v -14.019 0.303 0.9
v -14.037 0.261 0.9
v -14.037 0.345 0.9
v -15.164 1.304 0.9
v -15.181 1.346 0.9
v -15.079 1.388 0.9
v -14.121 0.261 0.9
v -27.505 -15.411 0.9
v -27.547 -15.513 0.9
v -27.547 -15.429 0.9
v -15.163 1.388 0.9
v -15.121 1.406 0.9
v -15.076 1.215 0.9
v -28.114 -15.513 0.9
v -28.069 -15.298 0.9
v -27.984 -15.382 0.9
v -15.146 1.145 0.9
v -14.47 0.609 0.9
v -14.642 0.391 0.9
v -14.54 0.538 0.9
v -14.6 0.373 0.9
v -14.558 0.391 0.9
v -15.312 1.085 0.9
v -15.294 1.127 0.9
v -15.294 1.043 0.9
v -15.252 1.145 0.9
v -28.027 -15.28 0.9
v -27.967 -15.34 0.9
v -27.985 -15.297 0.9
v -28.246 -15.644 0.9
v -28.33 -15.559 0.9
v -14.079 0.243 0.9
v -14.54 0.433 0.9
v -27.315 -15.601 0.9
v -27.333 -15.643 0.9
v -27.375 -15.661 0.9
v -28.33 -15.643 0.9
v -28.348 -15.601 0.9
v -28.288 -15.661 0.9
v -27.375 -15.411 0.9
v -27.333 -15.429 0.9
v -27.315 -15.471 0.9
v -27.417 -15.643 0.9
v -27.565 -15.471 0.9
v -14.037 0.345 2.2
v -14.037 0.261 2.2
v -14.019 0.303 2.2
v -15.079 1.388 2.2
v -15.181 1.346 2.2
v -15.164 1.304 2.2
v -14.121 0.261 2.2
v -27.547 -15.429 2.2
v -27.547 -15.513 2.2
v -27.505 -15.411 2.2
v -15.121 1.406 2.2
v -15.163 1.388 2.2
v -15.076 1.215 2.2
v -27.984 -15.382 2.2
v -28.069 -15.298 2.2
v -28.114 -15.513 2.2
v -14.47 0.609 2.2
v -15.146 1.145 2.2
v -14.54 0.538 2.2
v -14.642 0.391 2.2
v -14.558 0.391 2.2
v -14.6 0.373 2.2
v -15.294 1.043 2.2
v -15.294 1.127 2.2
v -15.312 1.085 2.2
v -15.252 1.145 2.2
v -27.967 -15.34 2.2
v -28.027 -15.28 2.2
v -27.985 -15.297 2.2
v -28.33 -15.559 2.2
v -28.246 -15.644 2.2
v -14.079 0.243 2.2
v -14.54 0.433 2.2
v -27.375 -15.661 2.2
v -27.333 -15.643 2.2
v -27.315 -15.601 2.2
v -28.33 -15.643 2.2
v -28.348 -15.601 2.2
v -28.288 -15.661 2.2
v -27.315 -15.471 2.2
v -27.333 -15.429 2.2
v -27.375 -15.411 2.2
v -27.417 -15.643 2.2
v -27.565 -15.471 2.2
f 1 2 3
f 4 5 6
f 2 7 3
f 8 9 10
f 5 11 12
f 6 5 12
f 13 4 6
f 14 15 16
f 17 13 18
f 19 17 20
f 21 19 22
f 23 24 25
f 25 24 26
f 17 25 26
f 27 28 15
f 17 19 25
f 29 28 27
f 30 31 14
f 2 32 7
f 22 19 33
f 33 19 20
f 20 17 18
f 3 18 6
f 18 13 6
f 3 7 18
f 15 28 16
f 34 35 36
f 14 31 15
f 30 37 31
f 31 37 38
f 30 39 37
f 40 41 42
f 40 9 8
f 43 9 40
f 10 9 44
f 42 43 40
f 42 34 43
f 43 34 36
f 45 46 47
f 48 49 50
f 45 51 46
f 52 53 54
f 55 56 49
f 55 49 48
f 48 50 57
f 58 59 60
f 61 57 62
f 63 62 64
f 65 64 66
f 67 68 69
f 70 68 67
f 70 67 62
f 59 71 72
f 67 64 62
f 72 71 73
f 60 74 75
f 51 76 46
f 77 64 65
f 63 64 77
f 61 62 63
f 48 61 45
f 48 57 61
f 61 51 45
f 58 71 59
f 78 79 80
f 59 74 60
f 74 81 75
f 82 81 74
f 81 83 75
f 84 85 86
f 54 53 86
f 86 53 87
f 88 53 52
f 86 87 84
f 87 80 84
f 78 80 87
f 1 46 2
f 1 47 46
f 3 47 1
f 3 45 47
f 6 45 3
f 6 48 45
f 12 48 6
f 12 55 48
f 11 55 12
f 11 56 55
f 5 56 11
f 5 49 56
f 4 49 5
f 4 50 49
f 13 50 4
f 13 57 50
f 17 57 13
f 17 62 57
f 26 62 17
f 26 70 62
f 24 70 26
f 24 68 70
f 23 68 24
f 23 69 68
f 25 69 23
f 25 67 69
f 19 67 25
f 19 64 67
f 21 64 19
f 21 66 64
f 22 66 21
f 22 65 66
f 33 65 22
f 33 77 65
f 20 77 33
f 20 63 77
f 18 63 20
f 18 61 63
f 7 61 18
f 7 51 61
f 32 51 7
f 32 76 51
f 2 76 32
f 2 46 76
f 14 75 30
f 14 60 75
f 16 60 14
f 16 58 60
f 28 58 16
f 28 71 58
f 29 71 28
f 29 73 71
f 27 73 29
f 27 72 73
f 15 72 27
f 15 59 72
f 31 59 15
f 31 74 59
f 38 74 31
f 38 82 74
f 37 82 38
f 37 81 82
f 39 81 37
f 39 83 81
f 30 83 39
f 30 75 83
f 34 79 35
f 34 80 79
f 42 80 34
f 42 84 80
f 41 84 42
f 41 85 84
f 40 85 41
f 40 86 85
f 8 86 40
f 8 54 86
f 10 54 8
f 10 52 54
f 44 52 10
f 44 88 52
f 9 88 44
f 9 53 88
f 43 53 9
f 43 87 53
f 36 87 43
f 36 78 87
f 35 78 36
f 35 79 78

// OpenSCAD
$fn = 24;
translate([0, -2.500, 0.900])
  linear_extrude(height=1.300) {
offset(r=0.06, $fn=8) {
    polygon(points=[[-28.288,-13.101],[-28.157,-12.971],[-28.027,-13.101],[-27.636,-13.101],[-27.505,-12.971],[-27.375,-13.101],[-27.375,-12.971],[-27.505,-12.971],[-27.636,-12.840],[-28.027,-12.840],[-28.157,-12.971],[-28.027,-12.840],[-27.636,-12.840],[-27.505,-12.971],[-27.636,-13.101],[-28.027,-13.101]], paths=[[0,1,2,3,4,5,6,7,8,9],[10,11,12,13,14,15]]);
    polygon(points=[[-15.382,3.715],[-14.470,2.803],[-14.600,2.933],[-14.600,3.063],[-14.470,3.194],[-14.079,2.803],[-15.121,3.846],[-14.991,3.715],[-15.121,3.585],[-15.252,3.585]], paths=[[0,1,2,3,4,5,6,7,8,9]]);
}
}
